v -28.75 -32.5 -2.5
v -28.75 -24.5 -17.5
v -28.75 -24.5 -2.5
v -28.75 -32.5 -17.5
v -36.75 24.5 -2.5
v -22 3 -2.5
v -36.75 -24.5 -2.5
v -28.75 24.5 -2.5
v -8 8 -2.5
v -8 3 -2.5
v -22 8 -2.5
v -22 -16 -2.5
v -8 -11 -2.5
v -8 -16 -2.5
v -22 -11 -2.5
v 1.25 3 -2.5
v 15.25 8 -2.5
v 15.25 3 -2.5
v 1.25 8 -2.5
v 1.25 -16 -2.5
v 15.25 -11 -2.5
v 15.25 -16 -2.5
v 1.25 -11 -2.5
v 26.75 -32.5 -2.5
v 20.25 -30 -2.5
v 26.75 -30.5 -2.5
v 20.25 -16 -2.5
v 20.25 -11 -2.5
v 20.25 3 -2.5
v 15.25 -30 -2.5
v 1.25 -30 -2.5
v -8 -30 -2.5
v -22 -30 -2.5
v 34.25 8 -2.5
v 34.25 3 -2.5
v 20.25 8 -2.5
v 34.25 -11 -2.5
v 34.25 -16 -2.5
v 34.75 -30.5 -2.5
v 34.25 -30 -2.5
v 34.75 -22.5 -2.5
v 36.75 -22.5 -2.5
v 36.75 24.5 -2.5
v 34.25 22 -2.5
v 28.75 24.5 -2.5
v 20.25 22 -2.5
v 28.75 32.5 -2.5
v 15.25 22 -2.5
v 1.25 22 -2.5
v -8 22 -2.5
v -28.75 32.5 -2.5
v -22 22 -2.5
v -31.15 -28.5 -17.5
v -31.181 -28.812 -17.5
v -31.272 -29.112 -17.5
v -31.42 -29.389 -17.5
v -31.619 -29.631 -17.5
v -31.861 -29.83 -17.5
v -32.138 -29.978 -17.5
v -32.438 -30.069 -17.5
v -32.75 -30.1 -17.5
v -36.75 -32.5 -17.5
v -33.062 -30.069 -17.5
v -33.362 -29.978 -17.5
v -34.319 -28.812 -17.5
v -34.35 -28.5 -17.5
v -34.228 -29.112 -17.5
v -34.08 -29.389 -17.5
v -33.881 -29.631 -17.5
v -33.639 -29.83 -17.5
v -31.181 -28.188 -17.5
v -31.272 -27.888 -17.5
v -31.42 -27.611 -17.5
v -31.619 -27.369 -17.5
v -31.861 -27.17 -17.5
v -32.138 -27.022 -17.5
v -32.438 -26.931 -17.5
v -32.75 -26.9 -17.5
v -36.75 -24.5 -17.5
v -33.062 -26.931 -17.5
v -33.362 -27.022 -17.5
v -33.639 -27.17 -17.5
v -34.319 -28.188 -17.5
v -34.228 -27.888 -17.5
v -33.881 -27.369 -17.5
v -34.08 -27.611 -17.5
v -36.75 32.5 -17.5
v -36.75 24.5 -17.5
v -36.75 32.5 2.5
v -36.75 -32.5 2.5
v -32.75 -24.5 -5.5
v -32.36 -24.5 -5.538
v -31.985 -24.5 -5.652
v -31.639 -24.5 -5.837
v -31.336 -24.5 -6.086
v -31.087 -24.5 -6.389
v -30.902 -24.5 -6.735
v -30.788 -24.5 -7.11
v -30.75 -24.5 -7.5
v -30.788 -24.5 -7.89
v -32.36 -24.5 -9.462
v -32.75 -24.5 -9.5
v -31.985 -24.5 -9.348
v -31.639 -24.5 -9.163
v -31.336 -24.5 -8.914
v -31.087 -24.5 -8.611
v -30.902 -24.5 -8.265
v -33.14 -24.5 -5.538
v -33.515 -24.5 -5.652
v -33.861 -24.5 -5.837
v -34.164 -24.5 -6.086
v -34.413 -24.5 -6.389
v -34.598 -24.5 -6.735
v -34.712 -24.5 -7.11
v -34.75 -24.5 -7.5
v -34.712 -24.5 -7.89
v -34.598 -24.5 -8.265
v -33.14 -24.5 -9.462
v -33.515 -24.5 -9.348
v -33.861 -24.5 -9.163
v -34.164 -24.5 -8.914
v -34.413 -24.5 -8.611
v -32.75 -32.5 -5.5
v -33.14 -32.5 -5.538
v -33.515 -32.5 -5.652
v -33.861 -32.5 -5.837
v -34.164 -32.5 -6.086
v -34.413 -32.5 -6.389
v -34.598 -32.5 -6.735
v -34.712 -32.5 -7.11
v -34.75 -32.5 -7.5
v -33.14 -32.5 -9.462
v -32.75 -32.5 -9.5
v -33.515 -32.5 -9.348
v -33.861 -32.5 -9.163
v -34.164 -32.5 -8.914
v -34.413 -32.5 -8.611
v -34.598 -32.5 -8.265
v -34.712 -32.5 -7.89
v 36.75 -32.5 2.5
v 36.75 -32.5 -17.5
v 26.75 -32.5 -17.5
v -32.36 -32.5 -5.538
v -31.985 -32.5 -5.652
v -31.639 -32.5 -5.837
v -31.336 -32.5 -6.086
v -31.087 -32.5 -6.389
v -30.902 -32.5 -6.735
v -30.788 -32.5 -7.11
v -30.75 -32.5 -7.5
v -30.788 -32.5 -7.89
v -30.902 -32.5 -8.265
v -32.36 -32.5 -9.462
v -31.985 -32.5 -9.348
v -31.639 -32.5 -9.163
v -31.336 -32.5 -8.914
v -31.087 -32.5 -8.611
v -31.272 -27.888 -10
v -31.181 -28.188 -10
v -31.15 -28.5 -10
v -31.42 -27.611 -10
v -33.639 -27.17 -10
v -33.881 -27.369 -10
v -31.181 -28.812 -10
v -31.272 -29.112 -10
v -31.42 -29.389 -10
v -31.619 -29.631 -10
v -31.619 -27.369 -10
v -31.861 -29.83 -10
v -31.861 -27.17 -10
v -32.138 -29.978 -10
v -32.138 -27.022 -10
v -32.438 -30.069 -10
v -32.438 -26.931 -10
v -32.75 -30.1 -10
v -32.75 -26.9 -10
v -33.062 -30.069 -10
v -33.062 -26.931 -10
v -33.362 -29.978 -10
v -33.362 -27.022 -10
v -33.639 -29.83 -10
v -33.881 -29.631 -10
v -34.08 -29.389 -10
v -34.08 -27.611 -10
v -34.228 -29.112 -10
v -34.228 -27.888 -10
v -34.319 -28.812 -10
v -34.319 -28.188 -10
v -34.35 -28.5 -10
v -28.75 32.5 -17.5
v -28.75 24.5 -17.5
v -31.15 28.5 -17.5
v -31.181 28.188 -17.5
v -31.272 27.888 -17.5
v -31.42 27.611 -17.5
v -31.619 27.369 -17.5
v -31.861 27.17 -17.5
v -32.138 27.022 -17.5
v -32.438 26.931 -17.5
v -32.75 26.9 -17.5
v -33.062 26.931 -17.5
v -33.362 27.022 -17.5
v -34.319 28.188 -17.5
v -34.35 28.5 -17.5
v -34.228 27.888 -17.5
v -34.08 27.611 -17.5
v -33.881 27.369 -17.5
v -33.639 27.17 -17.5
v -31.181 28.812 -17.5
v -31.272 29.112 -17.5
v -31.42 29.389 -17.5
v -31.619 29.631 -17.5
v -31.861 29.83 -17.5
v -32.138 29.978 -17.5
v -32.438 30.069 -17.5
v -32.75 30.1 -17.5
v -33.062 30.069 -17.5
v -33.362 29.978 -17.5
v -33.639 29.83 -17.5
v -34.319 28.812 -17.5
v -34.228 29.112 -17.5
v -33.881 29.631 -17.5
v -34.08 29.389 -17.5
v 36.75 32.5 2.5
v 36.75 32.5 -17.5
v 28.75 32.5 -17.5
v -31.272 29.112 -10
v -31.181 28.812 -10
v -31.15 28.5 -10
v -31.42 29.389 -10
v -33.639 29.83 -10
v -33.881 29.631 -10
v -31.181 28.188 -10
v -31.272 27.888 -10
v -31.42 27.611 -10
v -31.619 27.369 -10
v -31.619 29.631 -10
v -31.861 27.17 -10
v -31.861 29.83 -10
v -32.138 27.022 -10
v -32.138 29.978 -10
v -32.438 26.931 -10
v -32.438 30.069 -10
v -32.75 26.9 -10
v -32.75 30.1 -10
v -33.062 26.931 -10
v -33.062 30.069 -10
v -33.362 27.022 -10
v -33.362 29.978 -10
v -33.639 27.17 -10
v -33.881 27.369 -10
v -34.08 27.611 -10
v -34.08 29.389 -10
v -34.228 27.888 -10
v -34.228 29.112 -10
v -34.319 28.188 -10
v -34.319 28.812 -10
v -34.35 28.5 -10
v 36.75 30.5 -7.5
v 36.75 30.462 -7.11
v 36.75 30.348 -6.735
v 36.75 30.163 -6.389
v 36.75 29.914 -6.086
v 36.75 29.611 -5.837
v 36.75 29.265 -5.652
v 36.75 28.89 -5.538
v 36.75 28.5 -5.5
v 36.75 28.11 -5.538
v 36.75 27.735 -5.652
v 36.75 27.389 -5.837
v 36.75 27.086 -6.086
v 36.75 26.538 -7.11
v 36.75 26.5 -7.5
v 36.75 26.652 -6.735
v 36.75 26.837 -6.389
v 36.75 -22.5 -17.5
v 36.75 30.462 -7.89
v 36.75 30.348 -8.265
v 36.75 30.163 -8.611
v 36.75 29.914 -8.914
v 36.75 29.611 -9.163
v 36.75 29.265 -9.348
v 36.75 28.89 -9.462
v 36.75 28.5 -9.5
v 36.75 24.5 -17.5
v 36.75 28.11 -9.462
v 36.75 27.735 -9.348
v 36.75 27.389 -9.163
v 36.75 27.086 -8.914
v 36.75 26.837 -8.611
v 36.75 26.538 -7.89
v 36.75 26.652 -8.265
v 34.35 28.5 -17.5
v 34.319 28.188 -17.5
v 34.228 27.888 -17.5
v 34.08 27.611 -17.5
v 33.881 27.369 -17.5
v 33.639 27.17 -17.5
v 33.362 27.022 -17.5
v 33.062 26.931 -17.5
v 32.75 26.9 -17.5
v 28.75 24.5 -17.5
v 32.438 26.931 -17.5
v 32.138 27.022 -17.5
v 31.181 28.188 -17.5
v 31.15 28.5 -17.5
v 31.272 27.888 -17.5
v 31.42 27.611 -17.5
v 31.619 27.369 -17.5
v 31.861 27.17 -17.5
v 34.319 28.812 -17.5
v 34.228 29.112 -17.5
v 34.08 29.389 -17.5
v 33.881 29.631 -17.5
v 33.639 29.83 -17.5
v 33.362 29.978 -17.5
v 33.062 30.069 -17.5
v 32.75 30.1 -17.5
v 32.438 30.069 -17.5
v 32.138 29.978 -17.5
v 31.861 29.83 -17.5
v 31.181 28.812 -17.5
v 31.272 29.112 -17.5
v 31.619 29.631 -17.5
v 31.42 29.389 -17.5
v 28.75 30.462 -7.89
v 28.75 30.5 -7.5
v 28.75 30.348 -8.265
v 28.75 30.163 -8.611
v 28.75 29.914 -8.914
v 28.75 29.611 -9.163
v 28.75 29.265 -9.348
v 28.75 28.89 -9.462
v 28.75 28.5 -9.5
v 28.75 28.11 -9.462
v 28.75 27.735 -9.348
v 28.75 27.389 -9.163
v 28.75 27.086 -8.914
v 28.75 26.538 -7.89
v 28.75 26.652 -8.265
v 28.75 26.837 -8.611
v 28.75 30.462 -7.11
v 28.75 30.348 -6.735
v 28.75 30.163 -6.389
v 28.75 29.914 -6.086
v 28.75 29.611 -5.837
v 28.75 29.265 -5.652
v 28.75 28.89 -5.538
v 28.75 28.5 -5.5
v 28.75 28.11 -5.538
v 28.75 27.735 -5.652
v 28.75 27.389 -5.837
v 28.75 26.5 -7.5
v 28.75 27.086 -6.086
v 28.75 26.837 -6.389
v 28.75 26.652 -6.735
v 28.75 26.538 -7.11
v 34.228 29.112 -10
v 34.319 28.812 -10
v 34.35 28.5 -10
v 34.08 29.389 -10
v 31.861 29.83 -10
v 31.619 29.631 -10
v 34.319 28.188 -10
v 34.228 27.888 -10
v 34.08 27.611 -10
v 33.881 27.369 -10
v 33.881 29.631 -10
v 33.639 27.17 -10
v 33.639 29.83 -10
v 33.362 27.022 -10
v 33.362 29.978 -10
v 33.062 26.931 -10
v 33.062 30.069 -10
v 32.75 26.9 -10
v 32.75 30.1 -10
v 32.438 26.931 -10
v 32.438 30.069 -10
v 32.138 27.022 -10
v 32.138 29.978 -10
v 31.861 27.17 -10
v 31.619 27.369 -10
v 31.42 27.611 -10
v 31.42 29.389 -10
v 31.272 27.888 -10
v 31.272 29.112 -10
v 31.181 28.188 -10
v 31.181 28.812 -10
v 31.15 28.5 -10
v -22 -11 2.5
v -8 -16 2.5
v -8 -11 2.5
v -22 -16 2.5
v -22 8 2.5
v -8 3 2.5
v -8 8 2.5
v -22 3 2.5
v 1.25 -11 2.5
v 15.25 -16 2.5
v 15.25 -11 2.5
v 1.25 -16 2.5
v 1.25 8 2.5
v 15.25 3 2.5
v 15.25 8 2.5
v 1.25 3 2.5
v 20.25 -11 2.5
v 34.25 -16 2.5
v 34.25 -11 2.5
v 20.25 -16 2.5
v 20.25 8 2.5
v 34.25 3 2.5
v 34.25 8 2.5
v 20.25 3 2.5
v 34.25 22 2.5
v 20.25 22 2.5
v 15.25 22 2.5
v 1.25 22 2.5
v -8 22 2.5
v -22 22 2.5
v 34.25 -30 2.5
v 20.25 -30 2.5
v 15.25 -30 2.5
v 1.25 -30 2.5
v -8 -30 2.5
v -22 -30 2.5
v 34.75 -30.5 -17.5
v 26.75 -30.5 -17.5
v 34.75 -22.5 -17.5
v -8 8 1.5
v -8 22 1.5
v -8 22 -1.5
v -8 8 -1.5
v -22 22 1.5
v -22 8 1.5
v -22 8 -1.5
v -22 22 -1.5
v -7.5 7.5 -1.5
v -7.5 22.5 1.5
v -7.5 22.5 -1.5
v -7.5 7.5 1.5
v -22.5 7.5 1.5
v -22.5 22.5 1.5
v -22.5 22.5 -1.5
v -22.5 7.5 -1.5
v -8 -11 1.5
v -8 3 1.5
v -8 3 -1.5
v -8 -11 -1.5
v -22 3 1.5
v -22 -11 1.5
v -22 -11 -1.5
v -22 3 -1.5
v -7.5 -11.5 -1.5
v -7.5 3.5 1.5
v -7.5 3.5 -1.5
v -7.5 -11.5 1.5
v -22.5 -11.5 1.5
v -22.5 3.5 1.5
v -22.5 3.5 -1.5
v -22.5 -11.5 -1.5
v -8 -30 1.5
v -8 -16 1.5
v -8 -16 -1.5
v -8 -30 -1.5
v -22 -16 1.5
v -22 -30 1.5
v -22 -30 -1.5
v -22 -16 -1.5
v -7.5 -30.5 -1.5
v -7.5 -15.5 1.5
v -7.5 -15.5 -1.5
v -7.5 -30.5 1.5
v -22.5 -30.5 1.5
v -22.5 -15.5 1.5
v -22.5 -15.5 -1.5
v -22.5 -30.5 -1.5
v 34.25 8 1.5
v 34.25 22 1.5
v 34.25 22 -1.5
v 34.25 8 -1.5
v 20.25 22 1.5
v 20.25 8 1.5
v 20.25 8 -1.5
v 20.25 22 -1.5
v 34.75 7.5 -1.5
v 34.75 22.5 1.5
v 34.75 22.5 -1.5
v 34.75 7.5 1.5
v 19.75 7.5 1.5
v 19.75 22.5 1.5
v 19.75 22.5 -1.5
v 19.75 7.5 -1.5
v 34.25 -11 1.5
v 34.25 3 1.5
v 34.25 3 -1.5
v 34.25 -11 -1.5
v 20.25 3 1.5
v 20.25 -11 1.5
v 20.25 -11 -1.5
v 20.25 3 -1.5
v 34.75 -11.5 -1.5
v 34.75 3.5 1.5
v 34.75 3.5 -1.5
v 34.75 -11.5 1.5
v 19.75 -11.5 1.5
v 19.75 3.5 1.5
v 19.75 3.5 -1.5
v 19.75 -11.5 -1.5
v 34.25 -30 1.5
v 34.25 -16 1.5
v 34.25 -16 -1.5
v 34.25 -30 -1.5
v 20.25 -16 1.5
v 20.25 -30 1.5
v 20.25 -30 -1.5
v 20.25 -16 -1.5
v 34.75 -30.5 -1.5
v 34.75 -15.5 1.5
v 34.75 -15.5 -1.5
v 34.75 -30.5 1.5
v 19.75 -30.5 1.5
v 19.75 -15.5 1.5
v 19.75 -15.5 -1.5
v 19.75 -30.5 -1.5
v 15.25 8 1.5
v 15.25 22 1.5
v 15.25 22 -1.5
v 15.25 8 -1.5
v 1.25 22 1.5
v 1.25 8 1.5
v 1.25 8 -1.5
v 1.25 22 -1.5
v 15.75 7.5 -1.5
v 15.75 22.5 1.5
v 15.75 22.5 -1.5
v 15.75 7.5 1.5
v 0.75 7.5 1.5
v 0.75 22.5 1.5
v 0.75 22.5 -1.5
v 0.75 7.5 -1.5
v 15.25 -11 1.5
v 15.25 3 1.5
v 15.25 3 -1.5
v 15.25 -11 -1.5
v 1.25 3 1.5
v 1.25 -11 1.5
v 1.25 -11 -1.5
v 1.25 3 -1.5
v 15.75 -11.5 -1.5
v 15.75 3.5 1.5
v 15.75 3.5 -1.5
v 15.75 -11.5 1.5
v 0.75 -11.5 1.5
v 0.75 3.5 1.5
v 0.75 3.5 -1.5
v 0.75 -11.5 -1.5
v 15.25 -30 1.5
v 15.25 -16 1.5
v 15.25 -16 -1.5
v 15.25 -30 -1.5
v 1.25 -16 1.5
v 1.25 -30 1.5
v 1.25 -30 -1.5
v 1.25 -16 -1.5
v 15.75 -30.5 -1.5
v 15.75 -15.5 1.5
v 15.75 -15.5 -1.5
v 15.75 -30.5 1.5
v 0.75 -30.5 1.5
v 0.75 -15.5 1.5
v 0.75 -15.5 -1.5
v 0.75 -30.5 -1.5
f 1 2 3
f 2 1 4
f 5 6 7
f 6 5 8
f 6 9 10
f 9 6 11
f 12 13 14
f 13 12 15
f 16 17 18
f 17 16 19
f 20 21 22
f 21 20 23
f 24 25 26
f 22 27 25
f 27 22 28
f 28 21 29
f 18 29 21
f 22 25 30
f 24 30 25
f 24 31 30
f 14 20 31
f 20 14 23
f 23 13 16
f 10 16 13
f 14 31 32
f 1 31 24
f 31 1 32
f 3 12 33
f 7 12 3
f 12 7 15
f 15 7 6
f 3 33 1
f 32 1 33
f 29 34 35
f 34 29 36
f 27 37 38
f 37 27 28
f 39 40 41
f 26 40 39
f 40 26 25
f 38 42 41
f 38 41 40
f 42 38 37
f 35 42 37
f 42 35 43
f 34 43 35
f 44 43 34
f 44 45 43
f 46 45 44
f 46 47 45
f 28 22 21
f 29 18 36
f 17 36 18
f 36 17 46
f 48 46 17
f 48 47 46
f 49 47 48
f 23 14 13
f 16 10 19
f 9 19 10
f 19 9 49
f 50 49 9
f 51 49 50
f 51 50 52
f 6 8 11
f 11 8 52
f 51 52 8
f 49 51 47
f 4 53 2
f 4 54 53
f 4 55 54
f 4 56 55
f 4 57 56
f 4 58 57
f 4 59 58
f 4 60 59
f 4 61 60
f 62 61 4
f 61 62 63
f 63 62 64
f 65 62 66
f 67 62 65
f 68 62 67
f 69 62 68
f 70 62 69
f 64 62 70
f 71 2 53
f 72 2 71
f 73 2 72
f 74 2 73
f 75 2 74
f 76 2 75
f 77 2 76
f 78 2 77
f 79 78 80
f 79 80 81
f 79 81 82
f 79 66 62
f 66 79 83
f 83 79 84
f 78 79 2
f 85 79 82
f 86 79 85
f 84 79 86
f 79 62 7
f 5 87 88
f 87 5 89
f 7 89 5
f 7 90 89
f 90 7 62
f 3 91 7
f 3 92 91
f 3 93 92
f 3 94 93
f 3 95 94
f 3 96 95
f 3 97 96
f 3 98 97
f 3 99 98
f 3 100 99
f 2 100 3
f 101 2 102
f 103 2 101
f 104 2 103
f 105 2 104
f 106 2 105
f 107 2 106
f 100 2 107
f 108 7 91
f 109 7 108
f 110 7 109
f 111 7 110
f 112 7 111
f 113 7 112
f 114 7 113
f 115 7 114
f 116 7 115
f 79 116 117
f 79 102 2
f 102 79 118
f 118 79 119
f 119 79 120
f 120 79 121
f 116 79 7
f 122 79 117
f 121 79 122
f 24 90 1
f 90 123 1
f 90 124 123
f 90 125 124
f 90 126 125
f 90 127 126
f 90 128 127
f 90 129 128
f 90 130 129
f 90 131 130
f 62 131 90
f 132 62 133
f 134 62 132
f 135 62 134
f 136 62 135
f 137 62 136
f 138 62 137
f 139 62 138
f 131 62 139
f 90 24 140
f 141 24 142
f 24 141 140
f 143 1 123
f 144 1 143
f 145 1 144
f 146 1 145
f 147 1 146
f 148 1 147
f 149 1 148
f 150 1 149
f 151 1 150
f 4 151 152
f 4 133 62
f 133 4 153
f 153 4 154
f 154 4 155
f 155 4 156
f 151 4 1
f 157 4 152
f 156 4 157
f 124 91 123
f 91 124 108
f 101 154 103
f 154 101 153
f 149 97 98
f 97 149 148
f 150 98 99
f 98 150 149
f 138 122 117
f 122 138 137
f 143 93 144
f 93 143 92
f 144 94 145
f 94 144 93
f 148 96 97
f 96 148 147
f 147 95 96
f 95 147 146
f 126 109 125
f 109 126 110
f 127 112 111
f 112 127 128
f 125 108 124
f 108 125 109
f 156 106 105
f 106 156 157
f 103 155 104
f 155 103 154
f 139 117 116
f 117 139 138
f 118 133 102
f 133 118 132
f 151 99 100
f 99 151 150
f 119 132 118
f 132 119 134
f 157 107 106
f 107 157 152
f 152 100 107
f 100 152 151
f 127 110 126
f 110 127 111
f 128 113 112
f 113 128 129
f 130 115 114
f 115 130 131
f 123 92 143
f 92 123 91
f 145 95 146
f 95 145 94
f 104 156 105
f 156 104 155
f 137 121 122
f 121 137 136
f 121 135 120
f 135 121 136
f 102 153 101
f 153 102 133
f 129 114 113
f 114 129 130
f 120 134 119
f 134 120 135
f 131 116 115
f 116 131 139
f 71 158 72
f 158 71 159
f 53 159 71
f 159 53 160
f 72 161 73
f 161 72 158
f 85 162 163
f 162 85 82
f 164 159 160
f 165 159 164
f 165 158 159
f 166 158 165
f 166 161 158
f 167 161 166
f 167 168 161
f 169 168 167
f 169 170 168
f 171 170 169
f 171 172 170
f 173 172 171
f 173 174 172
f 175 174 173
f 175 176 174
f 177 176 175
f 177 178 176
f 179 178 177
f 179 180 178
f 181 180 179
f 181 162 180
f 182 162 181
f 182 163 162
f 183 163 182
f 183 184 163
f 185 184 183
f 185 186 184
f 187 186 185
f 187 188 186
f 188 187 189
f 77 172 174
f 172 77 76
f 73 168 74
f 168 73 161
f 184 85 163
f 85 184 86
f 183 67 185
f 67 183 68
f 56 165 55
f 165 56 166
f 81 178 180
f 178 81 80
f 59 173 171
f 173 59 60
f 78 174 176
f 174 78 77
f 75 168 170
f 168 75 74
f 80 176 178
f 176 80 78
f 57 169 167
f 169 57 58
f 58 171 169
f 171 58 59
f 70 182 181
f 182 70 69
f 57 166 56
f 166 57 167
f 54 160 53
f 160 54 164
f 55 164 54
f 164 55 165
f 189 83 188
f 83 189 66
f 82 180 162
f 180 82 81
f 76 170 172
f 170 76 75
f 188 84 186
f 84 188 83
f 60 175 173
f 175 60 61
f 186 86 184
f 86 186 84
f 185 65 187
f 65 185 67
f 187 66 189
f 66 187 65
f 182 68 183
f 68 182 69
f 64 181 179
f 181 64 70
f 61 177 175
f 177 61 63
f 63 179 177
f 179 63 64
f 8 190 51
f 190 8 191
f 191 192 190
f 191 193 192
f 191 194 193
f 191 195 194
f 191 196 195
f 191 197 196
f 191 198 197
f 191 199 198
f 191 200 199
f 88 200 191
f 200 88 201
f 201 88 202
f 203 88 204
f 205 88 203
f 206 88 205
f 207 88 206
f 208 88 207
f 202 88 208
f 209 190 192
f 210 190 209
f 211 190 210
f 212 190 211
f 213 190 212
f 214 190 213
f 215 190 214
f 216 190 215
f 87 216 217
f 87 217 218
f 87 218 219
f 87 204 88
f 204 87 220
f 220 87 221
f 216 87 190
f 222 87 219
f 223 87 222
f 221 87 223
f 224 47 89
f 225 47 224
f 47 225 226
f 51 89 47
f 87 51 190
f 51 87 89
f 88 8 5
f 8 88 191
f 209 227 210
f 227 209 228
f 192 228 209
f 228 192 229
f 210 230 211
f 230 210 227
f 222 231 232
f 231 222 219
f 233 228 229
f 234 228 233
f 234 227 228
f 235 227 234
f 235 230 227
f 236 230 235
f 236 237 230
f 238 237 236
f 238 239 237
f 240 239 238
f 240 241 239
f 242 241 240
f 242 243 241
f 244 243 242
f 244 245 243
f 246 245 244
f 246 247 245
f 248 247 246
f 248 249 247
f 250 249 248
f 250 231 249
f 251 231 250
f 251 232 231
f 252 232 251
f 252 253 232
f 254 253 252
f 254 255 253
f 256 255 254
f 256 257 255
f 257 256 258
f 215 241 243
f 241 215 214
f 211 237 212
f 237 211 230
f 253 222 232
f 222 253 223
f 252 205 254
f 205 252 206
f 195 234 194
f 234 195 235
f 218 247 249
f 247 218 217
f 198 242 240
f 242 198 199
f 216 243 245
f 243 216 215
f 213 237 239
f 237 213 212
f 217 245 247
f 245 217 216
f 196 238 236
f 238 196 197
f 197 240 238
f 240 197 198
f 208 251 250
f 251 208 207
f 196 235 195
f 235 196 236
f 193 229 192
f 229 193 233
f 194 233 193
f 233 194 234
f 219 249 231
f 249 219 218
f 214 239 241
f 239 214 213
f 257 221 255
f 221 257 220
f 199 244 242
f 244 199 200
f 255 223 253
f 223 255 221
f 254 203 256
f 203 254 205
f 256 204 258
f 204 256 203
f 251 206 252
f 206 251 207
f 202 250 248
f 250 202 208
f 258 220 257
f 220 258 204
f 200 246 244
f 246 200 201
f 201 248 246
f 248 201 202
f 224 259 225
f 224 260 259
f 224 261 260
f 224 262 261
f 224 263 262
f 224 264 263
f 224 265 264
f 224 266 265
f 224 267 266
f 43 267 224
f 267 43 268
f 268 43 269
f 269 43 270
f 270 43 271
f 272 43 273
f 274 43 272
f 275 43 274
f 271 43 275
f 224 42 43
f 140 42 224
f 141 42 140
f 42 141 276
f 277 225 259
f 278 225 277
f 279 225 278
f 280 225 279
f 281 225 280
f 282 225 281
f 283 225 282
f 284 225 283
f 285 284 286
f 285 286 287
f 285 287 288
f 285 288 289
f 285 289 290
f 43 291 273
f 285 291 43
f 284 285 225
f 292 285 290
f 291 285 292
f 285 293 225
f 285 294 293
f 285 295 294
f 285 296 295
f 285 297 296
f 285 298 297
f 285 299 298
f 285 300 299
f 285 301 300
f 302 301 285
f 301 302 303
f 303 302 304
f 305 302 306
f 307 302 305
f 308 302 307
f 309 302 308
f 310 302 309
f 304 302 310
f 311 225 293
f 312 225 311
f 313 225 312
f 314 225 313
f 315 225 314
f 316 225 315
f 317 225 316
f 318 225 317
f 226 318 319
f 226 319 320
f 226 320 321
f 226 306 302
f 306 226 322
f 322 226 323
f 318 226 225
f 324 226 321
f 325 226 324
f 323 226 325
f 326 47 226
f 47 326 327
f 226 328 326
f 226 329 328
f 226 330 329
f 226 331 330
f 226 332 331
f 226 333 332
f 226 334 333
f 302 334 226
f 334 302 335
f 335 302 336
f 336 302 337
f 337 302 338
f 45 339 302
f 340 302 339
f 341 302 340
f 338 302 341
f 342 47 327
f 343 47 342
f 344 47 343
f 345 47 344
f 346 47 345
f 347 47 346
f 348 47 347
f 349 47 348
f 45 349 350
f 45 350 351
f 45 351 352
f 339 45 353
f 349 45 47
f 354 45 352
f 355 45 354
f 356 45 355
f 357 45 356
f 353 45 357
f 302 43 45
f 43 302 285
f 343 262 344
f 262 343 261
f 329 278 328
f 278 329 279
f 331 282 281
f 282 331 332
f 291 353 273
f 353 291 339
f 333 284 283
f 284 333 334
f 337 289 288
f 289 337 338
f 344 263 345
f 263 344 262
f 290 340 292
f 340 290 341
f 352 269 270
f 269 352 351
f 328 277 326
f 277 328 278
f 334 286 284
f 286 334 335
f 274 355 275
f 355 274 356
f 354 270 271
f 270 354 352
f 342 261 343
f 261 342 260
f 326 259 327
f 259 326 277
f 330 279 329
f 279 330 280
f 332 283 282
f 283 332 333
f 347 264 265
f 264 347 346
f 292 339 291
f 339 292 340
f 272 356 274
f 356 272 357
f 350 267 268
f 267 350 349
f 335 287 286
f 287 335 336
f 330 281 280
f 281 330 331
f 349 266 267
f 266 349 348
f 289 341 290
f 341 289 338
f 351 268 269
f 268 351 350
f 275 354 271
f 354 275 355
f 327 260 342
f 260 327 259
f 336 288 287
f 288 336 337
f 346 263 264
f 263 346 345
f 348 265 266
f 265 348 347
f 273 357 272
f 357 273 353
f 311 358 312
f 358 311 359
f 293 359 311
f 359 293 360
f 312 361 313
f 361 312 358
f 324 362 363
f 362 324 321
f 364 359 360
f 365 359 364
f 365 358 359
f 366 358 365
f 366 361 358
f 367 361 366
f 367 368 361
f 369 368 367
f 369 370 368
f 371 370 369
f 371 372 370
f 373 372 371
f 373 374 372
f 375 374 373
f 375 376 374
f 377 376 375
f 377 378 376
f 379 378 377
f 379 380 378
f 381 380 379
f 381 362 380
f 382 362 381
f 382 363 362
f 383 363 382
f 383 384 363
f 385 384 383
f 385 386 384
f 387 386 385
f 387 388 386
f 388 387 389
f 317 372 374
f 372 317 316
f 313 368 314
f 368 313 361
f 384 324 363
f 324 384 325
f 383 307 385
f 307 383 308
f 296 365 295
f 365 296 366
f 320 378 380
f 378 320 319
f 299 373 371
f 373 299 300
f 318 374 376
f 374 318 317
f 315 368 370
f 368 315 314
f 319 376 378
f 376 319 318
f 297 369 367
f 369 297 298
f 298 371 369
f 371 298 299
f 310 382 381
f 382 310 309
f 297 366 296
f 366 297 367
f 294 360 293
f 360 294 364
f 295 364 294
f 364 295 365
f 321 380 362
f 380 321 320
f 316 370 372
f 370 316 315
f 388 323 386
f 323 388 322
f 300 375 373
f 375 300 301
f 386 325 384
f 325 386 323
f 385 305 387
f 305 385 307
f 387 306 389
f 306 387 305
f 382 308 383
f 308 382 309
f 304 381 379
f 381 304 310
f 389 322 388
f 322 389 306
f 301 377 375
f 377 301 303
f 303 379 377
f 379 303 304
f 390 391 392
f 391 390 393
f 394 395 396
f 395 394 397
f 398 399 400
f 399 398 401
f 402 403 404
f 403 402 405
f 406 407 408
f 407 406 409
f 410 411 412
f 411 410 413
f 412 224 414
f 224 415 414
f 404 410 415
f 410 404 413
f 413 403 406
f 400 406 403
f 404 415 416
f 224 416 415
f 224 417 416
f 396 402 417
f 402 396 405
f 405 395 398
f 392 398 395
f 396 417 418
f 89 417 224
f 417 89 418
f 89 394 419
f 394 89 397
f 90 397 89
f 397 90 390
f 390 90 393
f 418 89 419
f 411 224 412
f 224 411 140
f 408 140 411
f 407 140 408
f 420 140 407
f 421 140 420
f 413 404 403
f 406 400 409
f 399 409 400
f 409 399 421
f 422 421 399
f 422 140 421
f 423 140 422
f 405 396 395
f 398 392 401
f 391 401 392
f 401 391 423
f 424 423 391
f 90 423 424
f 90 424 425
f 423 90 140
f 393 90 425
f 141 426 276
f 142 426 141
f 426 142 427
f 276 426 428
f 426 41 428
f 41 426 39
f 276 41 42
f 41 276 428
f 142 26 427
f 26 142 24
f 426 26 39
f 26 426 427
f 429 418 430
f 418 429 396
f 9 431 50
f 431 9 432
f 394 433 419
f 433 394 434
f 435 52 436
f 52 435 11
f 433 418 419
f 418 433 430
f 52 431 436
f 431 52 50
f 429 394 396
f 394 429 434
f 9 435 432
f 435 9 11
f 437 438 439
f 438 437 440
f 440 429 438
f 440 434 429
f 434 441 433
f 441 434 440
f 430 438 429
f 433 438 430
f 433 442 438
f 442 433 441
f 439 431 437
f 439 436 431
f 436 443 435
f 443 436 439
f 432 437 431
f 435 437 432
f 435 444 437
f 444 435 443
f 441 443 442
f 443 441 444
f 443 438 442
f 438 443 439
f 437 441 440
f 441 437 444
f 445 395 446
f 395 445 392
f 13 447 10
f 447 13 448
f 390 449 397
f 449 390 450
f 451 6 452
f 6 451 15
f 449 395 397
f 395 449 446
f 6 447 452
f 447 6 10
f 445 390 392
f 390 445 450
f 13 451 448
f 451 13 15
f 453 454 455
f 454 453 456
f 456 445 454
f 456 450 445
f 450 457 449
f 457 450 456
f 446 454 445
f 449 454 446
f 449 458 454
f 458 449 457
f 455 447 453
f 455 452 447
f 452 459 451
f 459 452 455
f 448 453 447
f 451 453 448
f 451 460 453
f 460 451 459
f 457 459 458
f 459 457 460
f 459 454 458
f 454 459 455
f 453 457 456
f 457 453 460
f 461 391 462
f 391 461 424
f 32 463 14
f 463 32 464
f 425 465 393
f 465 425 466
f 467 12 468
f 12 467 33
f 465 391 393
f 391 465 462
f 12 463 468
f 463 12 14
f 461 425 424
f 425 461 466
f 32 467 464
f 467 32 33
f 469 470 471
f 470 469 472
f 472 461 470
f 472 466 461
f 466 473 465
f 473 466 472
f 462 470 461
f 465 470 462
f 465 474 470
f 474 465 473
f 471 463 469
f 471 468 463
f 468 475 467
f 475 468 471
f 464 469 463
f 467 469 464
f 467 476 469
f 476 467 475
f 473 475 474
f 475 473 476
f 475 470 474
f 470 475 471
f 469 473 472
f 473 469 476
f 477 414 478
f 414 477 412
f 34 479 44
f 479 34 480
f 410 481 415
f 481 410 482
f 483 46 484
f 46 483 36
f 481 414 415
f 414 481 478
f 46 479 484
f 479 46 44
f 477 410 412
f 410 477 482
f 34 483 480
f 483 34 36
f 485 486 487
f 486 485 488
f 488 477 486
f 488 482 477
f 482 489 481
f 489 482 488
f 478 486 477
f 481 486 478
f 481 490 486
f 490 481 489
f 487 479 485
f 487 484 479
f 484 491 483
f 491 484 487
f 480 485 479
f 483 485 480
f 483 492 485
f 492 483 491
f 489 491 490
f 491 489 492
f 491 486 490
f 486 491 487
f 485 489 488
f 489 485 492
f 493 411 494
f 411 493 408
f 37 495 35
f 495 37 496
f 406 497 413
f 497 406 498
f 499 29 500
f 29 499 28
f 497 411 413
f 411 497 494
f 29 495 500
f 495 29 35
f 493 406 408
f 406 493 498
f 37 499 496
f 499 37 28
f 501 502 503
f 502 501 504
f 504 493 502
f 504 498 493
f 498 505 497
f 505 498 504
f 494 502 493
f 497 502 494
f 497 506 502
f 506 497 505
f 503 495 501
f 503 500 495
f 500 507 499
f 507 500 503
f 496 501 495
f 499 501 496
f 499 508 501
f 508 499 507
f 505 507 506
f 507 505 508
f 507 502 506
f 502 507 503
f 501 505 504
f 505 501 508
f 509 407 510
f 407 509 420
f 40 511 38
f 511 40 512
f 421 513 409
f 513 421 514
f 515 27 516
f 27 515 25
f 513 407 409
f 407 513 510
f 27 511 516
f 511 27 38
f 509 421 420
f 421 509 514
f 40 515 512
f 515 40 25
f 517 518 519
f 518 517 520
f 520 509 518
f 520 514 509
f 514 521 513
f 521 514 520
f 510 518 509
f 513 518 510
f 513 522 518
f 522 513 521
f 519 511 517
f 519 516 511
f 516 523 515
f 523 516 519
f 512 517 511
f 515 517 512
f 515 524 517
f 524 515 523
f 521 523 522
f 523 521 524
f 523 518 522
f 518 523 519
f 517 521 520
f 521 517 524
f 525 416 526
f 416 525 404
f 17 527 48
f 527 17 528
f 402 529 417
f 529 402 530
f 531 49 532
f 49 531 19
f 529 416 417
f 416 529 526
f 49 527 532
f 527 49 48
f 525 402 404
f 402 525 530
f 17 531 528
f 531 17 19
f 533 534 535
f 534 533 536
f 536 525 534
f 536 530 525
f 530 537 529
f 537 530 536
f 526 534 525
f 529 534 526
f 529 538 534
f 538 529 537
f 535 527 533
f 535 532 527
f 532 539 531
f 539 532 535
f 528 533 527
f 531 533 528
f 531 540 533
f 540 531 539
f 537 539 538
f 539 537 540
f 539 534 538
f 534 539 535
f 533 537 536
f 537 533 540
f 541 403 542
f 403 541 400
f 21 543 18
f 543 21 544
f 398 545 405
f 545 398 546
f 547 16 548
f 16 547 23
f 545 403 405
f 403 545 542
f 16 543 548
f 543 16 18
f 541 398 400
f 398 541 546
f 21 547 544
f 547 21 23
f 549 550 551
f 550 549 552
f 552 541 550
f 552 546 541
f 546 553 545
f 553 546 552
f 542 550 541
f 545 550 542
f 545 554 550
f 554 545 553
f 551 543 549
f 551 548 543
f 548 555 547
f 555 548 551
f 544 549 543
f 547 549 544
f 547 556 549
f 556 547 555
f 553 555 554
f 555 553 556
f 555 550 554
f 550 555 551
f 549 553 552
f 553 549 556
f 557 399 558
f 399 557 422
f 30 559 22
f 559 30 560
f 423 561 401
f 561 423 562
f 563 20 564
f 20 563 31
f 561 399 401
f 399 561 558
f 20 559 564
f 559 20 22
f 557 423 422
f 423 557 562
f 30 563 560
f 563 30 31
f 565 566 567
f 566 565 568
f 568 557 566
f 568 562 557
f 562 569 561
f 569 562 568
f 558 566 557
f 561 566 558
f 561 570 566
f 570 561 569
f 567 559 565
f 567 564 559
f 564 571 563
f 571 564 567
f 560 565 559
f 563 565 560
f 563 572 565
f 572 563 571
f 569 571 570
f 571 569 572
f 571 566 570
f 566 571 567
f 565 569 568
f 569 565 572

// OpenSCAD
// file: common.scad
key_size = 14;
stabilizer_size = 3.5;

b_post = 8;
m_post_s = 2;
m_post_l = 10;
post_z = 15;

plat_z = 5;

module keyhole(x, y) {
  translate([x, y, 0]) {
    cube([key_size, key_size, plat_z + 1], center = true);
    cube([key_size + 1, key_size + 1, plat_z - 2], center = true);
  }
}

module double_wide(x, y) {
  keyhole(x, y);
  for (offset=[-12, 12]) {
     translate([x + offset, y - 1, 0]) {
       cube([stabilizer_size, key_size, plat_z + 1], center = true);
       translate([0, key_size/2, 0])
         cube([stabilizer_size, 1, plat_z - 2], center = true);
       translate([0, -key_size/2, 0])
         cube([stabilizer_size, 2, plat_z - 2], center = true);
     }
  }
}

module e_post(x, y, z) {
  translate([x, y, -(plat_z + post_z)/2]) {
    difference() {
      cube([b_post, b_post, post_z], center = true);
      translate([0, 0, -post_z/2]) cylinder(h=post_z, r=1.6, center=true, $fn=32);
    }
  }
}

module e_post_i(x, y, r) {
  translate([x, y, -(plat_z + post_z)/2]) {
    difference() {
      cube([b_post, b_post, post_z], center = true);
      translate([0, 0, post_z/6]) rotate(r) cylinder(h=b_post+1, r=2, center=true, $fn=32);
      translate([0, 0, -post_z/2]) cylinder(h=post_z, r=1.6, center=true, $fn=32);
    }
  }
}

module e_post_x(x, y) {
  e_post_i(x, y, [0, 90, 0]);
}


module e_post_y(x, y) {
  e_post_i(x, y, [90, 0, 0]);
}

module i_post_x(x, y) {
  translate([x, y, -(plat_z + post_z)/2]) cube([m_post_l, m_post_s, post_z], center = true);
}

module i_post_y(x, y) {
  translate([x, y, -(plat_z + post_z)/2]) cube([m_post_s, m_post_l, post_z], center = true);
}
// file: parameters.scad
key_size = 14;
key_sep = 5;
m_key_sep = 13.5;
l_key_sep = 33;

border = 8;
b_post = 8;
m_post_s = 2;
m_post_l = 10;
post_z = 15;

key_cell = key_size + key_sep;
m_key_cell_x = key_size + m_key_sep;
l_key_cell_x = 2*key_cell;

plat_z = 5;
// main file
// Alien bat section 1: top left section

include <parameters.scad>

plat_x = border + m_key_cell_x + 2 * key_cell;
plat_y = border + 3 * key_cell;

use <common.scad>

difference() {
  union() {
    cube([plat_x, plat_y, 5], center = true);
    e_post_y(-(plat_x-b_post)/2, -(plat_y-b_post)/2);
    e_post(-(plat_x-b_post)/2, (plat_y-b_post)/2);
    e_post_x((plat_x-b_post)/2, (plat_y-b_post)/2);

    i_post_y((plat_x-m_post_s)/2, -(plat_y-m_post_l)/2);
    i_post_x((plat_x-m_post_l)/2, -(plat_y-m_post_s)/2);
  }

  for (i = [0:2]) {
    keyhole(-plat_x/2 + border + m_key_cell_x/2, plat_y/2 - border - i*key_cell - key_cell/2);
  }
  for (i = [0:2]) {
    keyhole(plat_x/2 - key_cell/2, plat_y/2 - border - i*key_cell - key_cell/2);
  }
  for (i = [0:2]) {
    keyhole(plat_x/2 - key_cell - key_cell/2, plat_y/2 - border - i*key_cell - key_cell/2);
  }

}
